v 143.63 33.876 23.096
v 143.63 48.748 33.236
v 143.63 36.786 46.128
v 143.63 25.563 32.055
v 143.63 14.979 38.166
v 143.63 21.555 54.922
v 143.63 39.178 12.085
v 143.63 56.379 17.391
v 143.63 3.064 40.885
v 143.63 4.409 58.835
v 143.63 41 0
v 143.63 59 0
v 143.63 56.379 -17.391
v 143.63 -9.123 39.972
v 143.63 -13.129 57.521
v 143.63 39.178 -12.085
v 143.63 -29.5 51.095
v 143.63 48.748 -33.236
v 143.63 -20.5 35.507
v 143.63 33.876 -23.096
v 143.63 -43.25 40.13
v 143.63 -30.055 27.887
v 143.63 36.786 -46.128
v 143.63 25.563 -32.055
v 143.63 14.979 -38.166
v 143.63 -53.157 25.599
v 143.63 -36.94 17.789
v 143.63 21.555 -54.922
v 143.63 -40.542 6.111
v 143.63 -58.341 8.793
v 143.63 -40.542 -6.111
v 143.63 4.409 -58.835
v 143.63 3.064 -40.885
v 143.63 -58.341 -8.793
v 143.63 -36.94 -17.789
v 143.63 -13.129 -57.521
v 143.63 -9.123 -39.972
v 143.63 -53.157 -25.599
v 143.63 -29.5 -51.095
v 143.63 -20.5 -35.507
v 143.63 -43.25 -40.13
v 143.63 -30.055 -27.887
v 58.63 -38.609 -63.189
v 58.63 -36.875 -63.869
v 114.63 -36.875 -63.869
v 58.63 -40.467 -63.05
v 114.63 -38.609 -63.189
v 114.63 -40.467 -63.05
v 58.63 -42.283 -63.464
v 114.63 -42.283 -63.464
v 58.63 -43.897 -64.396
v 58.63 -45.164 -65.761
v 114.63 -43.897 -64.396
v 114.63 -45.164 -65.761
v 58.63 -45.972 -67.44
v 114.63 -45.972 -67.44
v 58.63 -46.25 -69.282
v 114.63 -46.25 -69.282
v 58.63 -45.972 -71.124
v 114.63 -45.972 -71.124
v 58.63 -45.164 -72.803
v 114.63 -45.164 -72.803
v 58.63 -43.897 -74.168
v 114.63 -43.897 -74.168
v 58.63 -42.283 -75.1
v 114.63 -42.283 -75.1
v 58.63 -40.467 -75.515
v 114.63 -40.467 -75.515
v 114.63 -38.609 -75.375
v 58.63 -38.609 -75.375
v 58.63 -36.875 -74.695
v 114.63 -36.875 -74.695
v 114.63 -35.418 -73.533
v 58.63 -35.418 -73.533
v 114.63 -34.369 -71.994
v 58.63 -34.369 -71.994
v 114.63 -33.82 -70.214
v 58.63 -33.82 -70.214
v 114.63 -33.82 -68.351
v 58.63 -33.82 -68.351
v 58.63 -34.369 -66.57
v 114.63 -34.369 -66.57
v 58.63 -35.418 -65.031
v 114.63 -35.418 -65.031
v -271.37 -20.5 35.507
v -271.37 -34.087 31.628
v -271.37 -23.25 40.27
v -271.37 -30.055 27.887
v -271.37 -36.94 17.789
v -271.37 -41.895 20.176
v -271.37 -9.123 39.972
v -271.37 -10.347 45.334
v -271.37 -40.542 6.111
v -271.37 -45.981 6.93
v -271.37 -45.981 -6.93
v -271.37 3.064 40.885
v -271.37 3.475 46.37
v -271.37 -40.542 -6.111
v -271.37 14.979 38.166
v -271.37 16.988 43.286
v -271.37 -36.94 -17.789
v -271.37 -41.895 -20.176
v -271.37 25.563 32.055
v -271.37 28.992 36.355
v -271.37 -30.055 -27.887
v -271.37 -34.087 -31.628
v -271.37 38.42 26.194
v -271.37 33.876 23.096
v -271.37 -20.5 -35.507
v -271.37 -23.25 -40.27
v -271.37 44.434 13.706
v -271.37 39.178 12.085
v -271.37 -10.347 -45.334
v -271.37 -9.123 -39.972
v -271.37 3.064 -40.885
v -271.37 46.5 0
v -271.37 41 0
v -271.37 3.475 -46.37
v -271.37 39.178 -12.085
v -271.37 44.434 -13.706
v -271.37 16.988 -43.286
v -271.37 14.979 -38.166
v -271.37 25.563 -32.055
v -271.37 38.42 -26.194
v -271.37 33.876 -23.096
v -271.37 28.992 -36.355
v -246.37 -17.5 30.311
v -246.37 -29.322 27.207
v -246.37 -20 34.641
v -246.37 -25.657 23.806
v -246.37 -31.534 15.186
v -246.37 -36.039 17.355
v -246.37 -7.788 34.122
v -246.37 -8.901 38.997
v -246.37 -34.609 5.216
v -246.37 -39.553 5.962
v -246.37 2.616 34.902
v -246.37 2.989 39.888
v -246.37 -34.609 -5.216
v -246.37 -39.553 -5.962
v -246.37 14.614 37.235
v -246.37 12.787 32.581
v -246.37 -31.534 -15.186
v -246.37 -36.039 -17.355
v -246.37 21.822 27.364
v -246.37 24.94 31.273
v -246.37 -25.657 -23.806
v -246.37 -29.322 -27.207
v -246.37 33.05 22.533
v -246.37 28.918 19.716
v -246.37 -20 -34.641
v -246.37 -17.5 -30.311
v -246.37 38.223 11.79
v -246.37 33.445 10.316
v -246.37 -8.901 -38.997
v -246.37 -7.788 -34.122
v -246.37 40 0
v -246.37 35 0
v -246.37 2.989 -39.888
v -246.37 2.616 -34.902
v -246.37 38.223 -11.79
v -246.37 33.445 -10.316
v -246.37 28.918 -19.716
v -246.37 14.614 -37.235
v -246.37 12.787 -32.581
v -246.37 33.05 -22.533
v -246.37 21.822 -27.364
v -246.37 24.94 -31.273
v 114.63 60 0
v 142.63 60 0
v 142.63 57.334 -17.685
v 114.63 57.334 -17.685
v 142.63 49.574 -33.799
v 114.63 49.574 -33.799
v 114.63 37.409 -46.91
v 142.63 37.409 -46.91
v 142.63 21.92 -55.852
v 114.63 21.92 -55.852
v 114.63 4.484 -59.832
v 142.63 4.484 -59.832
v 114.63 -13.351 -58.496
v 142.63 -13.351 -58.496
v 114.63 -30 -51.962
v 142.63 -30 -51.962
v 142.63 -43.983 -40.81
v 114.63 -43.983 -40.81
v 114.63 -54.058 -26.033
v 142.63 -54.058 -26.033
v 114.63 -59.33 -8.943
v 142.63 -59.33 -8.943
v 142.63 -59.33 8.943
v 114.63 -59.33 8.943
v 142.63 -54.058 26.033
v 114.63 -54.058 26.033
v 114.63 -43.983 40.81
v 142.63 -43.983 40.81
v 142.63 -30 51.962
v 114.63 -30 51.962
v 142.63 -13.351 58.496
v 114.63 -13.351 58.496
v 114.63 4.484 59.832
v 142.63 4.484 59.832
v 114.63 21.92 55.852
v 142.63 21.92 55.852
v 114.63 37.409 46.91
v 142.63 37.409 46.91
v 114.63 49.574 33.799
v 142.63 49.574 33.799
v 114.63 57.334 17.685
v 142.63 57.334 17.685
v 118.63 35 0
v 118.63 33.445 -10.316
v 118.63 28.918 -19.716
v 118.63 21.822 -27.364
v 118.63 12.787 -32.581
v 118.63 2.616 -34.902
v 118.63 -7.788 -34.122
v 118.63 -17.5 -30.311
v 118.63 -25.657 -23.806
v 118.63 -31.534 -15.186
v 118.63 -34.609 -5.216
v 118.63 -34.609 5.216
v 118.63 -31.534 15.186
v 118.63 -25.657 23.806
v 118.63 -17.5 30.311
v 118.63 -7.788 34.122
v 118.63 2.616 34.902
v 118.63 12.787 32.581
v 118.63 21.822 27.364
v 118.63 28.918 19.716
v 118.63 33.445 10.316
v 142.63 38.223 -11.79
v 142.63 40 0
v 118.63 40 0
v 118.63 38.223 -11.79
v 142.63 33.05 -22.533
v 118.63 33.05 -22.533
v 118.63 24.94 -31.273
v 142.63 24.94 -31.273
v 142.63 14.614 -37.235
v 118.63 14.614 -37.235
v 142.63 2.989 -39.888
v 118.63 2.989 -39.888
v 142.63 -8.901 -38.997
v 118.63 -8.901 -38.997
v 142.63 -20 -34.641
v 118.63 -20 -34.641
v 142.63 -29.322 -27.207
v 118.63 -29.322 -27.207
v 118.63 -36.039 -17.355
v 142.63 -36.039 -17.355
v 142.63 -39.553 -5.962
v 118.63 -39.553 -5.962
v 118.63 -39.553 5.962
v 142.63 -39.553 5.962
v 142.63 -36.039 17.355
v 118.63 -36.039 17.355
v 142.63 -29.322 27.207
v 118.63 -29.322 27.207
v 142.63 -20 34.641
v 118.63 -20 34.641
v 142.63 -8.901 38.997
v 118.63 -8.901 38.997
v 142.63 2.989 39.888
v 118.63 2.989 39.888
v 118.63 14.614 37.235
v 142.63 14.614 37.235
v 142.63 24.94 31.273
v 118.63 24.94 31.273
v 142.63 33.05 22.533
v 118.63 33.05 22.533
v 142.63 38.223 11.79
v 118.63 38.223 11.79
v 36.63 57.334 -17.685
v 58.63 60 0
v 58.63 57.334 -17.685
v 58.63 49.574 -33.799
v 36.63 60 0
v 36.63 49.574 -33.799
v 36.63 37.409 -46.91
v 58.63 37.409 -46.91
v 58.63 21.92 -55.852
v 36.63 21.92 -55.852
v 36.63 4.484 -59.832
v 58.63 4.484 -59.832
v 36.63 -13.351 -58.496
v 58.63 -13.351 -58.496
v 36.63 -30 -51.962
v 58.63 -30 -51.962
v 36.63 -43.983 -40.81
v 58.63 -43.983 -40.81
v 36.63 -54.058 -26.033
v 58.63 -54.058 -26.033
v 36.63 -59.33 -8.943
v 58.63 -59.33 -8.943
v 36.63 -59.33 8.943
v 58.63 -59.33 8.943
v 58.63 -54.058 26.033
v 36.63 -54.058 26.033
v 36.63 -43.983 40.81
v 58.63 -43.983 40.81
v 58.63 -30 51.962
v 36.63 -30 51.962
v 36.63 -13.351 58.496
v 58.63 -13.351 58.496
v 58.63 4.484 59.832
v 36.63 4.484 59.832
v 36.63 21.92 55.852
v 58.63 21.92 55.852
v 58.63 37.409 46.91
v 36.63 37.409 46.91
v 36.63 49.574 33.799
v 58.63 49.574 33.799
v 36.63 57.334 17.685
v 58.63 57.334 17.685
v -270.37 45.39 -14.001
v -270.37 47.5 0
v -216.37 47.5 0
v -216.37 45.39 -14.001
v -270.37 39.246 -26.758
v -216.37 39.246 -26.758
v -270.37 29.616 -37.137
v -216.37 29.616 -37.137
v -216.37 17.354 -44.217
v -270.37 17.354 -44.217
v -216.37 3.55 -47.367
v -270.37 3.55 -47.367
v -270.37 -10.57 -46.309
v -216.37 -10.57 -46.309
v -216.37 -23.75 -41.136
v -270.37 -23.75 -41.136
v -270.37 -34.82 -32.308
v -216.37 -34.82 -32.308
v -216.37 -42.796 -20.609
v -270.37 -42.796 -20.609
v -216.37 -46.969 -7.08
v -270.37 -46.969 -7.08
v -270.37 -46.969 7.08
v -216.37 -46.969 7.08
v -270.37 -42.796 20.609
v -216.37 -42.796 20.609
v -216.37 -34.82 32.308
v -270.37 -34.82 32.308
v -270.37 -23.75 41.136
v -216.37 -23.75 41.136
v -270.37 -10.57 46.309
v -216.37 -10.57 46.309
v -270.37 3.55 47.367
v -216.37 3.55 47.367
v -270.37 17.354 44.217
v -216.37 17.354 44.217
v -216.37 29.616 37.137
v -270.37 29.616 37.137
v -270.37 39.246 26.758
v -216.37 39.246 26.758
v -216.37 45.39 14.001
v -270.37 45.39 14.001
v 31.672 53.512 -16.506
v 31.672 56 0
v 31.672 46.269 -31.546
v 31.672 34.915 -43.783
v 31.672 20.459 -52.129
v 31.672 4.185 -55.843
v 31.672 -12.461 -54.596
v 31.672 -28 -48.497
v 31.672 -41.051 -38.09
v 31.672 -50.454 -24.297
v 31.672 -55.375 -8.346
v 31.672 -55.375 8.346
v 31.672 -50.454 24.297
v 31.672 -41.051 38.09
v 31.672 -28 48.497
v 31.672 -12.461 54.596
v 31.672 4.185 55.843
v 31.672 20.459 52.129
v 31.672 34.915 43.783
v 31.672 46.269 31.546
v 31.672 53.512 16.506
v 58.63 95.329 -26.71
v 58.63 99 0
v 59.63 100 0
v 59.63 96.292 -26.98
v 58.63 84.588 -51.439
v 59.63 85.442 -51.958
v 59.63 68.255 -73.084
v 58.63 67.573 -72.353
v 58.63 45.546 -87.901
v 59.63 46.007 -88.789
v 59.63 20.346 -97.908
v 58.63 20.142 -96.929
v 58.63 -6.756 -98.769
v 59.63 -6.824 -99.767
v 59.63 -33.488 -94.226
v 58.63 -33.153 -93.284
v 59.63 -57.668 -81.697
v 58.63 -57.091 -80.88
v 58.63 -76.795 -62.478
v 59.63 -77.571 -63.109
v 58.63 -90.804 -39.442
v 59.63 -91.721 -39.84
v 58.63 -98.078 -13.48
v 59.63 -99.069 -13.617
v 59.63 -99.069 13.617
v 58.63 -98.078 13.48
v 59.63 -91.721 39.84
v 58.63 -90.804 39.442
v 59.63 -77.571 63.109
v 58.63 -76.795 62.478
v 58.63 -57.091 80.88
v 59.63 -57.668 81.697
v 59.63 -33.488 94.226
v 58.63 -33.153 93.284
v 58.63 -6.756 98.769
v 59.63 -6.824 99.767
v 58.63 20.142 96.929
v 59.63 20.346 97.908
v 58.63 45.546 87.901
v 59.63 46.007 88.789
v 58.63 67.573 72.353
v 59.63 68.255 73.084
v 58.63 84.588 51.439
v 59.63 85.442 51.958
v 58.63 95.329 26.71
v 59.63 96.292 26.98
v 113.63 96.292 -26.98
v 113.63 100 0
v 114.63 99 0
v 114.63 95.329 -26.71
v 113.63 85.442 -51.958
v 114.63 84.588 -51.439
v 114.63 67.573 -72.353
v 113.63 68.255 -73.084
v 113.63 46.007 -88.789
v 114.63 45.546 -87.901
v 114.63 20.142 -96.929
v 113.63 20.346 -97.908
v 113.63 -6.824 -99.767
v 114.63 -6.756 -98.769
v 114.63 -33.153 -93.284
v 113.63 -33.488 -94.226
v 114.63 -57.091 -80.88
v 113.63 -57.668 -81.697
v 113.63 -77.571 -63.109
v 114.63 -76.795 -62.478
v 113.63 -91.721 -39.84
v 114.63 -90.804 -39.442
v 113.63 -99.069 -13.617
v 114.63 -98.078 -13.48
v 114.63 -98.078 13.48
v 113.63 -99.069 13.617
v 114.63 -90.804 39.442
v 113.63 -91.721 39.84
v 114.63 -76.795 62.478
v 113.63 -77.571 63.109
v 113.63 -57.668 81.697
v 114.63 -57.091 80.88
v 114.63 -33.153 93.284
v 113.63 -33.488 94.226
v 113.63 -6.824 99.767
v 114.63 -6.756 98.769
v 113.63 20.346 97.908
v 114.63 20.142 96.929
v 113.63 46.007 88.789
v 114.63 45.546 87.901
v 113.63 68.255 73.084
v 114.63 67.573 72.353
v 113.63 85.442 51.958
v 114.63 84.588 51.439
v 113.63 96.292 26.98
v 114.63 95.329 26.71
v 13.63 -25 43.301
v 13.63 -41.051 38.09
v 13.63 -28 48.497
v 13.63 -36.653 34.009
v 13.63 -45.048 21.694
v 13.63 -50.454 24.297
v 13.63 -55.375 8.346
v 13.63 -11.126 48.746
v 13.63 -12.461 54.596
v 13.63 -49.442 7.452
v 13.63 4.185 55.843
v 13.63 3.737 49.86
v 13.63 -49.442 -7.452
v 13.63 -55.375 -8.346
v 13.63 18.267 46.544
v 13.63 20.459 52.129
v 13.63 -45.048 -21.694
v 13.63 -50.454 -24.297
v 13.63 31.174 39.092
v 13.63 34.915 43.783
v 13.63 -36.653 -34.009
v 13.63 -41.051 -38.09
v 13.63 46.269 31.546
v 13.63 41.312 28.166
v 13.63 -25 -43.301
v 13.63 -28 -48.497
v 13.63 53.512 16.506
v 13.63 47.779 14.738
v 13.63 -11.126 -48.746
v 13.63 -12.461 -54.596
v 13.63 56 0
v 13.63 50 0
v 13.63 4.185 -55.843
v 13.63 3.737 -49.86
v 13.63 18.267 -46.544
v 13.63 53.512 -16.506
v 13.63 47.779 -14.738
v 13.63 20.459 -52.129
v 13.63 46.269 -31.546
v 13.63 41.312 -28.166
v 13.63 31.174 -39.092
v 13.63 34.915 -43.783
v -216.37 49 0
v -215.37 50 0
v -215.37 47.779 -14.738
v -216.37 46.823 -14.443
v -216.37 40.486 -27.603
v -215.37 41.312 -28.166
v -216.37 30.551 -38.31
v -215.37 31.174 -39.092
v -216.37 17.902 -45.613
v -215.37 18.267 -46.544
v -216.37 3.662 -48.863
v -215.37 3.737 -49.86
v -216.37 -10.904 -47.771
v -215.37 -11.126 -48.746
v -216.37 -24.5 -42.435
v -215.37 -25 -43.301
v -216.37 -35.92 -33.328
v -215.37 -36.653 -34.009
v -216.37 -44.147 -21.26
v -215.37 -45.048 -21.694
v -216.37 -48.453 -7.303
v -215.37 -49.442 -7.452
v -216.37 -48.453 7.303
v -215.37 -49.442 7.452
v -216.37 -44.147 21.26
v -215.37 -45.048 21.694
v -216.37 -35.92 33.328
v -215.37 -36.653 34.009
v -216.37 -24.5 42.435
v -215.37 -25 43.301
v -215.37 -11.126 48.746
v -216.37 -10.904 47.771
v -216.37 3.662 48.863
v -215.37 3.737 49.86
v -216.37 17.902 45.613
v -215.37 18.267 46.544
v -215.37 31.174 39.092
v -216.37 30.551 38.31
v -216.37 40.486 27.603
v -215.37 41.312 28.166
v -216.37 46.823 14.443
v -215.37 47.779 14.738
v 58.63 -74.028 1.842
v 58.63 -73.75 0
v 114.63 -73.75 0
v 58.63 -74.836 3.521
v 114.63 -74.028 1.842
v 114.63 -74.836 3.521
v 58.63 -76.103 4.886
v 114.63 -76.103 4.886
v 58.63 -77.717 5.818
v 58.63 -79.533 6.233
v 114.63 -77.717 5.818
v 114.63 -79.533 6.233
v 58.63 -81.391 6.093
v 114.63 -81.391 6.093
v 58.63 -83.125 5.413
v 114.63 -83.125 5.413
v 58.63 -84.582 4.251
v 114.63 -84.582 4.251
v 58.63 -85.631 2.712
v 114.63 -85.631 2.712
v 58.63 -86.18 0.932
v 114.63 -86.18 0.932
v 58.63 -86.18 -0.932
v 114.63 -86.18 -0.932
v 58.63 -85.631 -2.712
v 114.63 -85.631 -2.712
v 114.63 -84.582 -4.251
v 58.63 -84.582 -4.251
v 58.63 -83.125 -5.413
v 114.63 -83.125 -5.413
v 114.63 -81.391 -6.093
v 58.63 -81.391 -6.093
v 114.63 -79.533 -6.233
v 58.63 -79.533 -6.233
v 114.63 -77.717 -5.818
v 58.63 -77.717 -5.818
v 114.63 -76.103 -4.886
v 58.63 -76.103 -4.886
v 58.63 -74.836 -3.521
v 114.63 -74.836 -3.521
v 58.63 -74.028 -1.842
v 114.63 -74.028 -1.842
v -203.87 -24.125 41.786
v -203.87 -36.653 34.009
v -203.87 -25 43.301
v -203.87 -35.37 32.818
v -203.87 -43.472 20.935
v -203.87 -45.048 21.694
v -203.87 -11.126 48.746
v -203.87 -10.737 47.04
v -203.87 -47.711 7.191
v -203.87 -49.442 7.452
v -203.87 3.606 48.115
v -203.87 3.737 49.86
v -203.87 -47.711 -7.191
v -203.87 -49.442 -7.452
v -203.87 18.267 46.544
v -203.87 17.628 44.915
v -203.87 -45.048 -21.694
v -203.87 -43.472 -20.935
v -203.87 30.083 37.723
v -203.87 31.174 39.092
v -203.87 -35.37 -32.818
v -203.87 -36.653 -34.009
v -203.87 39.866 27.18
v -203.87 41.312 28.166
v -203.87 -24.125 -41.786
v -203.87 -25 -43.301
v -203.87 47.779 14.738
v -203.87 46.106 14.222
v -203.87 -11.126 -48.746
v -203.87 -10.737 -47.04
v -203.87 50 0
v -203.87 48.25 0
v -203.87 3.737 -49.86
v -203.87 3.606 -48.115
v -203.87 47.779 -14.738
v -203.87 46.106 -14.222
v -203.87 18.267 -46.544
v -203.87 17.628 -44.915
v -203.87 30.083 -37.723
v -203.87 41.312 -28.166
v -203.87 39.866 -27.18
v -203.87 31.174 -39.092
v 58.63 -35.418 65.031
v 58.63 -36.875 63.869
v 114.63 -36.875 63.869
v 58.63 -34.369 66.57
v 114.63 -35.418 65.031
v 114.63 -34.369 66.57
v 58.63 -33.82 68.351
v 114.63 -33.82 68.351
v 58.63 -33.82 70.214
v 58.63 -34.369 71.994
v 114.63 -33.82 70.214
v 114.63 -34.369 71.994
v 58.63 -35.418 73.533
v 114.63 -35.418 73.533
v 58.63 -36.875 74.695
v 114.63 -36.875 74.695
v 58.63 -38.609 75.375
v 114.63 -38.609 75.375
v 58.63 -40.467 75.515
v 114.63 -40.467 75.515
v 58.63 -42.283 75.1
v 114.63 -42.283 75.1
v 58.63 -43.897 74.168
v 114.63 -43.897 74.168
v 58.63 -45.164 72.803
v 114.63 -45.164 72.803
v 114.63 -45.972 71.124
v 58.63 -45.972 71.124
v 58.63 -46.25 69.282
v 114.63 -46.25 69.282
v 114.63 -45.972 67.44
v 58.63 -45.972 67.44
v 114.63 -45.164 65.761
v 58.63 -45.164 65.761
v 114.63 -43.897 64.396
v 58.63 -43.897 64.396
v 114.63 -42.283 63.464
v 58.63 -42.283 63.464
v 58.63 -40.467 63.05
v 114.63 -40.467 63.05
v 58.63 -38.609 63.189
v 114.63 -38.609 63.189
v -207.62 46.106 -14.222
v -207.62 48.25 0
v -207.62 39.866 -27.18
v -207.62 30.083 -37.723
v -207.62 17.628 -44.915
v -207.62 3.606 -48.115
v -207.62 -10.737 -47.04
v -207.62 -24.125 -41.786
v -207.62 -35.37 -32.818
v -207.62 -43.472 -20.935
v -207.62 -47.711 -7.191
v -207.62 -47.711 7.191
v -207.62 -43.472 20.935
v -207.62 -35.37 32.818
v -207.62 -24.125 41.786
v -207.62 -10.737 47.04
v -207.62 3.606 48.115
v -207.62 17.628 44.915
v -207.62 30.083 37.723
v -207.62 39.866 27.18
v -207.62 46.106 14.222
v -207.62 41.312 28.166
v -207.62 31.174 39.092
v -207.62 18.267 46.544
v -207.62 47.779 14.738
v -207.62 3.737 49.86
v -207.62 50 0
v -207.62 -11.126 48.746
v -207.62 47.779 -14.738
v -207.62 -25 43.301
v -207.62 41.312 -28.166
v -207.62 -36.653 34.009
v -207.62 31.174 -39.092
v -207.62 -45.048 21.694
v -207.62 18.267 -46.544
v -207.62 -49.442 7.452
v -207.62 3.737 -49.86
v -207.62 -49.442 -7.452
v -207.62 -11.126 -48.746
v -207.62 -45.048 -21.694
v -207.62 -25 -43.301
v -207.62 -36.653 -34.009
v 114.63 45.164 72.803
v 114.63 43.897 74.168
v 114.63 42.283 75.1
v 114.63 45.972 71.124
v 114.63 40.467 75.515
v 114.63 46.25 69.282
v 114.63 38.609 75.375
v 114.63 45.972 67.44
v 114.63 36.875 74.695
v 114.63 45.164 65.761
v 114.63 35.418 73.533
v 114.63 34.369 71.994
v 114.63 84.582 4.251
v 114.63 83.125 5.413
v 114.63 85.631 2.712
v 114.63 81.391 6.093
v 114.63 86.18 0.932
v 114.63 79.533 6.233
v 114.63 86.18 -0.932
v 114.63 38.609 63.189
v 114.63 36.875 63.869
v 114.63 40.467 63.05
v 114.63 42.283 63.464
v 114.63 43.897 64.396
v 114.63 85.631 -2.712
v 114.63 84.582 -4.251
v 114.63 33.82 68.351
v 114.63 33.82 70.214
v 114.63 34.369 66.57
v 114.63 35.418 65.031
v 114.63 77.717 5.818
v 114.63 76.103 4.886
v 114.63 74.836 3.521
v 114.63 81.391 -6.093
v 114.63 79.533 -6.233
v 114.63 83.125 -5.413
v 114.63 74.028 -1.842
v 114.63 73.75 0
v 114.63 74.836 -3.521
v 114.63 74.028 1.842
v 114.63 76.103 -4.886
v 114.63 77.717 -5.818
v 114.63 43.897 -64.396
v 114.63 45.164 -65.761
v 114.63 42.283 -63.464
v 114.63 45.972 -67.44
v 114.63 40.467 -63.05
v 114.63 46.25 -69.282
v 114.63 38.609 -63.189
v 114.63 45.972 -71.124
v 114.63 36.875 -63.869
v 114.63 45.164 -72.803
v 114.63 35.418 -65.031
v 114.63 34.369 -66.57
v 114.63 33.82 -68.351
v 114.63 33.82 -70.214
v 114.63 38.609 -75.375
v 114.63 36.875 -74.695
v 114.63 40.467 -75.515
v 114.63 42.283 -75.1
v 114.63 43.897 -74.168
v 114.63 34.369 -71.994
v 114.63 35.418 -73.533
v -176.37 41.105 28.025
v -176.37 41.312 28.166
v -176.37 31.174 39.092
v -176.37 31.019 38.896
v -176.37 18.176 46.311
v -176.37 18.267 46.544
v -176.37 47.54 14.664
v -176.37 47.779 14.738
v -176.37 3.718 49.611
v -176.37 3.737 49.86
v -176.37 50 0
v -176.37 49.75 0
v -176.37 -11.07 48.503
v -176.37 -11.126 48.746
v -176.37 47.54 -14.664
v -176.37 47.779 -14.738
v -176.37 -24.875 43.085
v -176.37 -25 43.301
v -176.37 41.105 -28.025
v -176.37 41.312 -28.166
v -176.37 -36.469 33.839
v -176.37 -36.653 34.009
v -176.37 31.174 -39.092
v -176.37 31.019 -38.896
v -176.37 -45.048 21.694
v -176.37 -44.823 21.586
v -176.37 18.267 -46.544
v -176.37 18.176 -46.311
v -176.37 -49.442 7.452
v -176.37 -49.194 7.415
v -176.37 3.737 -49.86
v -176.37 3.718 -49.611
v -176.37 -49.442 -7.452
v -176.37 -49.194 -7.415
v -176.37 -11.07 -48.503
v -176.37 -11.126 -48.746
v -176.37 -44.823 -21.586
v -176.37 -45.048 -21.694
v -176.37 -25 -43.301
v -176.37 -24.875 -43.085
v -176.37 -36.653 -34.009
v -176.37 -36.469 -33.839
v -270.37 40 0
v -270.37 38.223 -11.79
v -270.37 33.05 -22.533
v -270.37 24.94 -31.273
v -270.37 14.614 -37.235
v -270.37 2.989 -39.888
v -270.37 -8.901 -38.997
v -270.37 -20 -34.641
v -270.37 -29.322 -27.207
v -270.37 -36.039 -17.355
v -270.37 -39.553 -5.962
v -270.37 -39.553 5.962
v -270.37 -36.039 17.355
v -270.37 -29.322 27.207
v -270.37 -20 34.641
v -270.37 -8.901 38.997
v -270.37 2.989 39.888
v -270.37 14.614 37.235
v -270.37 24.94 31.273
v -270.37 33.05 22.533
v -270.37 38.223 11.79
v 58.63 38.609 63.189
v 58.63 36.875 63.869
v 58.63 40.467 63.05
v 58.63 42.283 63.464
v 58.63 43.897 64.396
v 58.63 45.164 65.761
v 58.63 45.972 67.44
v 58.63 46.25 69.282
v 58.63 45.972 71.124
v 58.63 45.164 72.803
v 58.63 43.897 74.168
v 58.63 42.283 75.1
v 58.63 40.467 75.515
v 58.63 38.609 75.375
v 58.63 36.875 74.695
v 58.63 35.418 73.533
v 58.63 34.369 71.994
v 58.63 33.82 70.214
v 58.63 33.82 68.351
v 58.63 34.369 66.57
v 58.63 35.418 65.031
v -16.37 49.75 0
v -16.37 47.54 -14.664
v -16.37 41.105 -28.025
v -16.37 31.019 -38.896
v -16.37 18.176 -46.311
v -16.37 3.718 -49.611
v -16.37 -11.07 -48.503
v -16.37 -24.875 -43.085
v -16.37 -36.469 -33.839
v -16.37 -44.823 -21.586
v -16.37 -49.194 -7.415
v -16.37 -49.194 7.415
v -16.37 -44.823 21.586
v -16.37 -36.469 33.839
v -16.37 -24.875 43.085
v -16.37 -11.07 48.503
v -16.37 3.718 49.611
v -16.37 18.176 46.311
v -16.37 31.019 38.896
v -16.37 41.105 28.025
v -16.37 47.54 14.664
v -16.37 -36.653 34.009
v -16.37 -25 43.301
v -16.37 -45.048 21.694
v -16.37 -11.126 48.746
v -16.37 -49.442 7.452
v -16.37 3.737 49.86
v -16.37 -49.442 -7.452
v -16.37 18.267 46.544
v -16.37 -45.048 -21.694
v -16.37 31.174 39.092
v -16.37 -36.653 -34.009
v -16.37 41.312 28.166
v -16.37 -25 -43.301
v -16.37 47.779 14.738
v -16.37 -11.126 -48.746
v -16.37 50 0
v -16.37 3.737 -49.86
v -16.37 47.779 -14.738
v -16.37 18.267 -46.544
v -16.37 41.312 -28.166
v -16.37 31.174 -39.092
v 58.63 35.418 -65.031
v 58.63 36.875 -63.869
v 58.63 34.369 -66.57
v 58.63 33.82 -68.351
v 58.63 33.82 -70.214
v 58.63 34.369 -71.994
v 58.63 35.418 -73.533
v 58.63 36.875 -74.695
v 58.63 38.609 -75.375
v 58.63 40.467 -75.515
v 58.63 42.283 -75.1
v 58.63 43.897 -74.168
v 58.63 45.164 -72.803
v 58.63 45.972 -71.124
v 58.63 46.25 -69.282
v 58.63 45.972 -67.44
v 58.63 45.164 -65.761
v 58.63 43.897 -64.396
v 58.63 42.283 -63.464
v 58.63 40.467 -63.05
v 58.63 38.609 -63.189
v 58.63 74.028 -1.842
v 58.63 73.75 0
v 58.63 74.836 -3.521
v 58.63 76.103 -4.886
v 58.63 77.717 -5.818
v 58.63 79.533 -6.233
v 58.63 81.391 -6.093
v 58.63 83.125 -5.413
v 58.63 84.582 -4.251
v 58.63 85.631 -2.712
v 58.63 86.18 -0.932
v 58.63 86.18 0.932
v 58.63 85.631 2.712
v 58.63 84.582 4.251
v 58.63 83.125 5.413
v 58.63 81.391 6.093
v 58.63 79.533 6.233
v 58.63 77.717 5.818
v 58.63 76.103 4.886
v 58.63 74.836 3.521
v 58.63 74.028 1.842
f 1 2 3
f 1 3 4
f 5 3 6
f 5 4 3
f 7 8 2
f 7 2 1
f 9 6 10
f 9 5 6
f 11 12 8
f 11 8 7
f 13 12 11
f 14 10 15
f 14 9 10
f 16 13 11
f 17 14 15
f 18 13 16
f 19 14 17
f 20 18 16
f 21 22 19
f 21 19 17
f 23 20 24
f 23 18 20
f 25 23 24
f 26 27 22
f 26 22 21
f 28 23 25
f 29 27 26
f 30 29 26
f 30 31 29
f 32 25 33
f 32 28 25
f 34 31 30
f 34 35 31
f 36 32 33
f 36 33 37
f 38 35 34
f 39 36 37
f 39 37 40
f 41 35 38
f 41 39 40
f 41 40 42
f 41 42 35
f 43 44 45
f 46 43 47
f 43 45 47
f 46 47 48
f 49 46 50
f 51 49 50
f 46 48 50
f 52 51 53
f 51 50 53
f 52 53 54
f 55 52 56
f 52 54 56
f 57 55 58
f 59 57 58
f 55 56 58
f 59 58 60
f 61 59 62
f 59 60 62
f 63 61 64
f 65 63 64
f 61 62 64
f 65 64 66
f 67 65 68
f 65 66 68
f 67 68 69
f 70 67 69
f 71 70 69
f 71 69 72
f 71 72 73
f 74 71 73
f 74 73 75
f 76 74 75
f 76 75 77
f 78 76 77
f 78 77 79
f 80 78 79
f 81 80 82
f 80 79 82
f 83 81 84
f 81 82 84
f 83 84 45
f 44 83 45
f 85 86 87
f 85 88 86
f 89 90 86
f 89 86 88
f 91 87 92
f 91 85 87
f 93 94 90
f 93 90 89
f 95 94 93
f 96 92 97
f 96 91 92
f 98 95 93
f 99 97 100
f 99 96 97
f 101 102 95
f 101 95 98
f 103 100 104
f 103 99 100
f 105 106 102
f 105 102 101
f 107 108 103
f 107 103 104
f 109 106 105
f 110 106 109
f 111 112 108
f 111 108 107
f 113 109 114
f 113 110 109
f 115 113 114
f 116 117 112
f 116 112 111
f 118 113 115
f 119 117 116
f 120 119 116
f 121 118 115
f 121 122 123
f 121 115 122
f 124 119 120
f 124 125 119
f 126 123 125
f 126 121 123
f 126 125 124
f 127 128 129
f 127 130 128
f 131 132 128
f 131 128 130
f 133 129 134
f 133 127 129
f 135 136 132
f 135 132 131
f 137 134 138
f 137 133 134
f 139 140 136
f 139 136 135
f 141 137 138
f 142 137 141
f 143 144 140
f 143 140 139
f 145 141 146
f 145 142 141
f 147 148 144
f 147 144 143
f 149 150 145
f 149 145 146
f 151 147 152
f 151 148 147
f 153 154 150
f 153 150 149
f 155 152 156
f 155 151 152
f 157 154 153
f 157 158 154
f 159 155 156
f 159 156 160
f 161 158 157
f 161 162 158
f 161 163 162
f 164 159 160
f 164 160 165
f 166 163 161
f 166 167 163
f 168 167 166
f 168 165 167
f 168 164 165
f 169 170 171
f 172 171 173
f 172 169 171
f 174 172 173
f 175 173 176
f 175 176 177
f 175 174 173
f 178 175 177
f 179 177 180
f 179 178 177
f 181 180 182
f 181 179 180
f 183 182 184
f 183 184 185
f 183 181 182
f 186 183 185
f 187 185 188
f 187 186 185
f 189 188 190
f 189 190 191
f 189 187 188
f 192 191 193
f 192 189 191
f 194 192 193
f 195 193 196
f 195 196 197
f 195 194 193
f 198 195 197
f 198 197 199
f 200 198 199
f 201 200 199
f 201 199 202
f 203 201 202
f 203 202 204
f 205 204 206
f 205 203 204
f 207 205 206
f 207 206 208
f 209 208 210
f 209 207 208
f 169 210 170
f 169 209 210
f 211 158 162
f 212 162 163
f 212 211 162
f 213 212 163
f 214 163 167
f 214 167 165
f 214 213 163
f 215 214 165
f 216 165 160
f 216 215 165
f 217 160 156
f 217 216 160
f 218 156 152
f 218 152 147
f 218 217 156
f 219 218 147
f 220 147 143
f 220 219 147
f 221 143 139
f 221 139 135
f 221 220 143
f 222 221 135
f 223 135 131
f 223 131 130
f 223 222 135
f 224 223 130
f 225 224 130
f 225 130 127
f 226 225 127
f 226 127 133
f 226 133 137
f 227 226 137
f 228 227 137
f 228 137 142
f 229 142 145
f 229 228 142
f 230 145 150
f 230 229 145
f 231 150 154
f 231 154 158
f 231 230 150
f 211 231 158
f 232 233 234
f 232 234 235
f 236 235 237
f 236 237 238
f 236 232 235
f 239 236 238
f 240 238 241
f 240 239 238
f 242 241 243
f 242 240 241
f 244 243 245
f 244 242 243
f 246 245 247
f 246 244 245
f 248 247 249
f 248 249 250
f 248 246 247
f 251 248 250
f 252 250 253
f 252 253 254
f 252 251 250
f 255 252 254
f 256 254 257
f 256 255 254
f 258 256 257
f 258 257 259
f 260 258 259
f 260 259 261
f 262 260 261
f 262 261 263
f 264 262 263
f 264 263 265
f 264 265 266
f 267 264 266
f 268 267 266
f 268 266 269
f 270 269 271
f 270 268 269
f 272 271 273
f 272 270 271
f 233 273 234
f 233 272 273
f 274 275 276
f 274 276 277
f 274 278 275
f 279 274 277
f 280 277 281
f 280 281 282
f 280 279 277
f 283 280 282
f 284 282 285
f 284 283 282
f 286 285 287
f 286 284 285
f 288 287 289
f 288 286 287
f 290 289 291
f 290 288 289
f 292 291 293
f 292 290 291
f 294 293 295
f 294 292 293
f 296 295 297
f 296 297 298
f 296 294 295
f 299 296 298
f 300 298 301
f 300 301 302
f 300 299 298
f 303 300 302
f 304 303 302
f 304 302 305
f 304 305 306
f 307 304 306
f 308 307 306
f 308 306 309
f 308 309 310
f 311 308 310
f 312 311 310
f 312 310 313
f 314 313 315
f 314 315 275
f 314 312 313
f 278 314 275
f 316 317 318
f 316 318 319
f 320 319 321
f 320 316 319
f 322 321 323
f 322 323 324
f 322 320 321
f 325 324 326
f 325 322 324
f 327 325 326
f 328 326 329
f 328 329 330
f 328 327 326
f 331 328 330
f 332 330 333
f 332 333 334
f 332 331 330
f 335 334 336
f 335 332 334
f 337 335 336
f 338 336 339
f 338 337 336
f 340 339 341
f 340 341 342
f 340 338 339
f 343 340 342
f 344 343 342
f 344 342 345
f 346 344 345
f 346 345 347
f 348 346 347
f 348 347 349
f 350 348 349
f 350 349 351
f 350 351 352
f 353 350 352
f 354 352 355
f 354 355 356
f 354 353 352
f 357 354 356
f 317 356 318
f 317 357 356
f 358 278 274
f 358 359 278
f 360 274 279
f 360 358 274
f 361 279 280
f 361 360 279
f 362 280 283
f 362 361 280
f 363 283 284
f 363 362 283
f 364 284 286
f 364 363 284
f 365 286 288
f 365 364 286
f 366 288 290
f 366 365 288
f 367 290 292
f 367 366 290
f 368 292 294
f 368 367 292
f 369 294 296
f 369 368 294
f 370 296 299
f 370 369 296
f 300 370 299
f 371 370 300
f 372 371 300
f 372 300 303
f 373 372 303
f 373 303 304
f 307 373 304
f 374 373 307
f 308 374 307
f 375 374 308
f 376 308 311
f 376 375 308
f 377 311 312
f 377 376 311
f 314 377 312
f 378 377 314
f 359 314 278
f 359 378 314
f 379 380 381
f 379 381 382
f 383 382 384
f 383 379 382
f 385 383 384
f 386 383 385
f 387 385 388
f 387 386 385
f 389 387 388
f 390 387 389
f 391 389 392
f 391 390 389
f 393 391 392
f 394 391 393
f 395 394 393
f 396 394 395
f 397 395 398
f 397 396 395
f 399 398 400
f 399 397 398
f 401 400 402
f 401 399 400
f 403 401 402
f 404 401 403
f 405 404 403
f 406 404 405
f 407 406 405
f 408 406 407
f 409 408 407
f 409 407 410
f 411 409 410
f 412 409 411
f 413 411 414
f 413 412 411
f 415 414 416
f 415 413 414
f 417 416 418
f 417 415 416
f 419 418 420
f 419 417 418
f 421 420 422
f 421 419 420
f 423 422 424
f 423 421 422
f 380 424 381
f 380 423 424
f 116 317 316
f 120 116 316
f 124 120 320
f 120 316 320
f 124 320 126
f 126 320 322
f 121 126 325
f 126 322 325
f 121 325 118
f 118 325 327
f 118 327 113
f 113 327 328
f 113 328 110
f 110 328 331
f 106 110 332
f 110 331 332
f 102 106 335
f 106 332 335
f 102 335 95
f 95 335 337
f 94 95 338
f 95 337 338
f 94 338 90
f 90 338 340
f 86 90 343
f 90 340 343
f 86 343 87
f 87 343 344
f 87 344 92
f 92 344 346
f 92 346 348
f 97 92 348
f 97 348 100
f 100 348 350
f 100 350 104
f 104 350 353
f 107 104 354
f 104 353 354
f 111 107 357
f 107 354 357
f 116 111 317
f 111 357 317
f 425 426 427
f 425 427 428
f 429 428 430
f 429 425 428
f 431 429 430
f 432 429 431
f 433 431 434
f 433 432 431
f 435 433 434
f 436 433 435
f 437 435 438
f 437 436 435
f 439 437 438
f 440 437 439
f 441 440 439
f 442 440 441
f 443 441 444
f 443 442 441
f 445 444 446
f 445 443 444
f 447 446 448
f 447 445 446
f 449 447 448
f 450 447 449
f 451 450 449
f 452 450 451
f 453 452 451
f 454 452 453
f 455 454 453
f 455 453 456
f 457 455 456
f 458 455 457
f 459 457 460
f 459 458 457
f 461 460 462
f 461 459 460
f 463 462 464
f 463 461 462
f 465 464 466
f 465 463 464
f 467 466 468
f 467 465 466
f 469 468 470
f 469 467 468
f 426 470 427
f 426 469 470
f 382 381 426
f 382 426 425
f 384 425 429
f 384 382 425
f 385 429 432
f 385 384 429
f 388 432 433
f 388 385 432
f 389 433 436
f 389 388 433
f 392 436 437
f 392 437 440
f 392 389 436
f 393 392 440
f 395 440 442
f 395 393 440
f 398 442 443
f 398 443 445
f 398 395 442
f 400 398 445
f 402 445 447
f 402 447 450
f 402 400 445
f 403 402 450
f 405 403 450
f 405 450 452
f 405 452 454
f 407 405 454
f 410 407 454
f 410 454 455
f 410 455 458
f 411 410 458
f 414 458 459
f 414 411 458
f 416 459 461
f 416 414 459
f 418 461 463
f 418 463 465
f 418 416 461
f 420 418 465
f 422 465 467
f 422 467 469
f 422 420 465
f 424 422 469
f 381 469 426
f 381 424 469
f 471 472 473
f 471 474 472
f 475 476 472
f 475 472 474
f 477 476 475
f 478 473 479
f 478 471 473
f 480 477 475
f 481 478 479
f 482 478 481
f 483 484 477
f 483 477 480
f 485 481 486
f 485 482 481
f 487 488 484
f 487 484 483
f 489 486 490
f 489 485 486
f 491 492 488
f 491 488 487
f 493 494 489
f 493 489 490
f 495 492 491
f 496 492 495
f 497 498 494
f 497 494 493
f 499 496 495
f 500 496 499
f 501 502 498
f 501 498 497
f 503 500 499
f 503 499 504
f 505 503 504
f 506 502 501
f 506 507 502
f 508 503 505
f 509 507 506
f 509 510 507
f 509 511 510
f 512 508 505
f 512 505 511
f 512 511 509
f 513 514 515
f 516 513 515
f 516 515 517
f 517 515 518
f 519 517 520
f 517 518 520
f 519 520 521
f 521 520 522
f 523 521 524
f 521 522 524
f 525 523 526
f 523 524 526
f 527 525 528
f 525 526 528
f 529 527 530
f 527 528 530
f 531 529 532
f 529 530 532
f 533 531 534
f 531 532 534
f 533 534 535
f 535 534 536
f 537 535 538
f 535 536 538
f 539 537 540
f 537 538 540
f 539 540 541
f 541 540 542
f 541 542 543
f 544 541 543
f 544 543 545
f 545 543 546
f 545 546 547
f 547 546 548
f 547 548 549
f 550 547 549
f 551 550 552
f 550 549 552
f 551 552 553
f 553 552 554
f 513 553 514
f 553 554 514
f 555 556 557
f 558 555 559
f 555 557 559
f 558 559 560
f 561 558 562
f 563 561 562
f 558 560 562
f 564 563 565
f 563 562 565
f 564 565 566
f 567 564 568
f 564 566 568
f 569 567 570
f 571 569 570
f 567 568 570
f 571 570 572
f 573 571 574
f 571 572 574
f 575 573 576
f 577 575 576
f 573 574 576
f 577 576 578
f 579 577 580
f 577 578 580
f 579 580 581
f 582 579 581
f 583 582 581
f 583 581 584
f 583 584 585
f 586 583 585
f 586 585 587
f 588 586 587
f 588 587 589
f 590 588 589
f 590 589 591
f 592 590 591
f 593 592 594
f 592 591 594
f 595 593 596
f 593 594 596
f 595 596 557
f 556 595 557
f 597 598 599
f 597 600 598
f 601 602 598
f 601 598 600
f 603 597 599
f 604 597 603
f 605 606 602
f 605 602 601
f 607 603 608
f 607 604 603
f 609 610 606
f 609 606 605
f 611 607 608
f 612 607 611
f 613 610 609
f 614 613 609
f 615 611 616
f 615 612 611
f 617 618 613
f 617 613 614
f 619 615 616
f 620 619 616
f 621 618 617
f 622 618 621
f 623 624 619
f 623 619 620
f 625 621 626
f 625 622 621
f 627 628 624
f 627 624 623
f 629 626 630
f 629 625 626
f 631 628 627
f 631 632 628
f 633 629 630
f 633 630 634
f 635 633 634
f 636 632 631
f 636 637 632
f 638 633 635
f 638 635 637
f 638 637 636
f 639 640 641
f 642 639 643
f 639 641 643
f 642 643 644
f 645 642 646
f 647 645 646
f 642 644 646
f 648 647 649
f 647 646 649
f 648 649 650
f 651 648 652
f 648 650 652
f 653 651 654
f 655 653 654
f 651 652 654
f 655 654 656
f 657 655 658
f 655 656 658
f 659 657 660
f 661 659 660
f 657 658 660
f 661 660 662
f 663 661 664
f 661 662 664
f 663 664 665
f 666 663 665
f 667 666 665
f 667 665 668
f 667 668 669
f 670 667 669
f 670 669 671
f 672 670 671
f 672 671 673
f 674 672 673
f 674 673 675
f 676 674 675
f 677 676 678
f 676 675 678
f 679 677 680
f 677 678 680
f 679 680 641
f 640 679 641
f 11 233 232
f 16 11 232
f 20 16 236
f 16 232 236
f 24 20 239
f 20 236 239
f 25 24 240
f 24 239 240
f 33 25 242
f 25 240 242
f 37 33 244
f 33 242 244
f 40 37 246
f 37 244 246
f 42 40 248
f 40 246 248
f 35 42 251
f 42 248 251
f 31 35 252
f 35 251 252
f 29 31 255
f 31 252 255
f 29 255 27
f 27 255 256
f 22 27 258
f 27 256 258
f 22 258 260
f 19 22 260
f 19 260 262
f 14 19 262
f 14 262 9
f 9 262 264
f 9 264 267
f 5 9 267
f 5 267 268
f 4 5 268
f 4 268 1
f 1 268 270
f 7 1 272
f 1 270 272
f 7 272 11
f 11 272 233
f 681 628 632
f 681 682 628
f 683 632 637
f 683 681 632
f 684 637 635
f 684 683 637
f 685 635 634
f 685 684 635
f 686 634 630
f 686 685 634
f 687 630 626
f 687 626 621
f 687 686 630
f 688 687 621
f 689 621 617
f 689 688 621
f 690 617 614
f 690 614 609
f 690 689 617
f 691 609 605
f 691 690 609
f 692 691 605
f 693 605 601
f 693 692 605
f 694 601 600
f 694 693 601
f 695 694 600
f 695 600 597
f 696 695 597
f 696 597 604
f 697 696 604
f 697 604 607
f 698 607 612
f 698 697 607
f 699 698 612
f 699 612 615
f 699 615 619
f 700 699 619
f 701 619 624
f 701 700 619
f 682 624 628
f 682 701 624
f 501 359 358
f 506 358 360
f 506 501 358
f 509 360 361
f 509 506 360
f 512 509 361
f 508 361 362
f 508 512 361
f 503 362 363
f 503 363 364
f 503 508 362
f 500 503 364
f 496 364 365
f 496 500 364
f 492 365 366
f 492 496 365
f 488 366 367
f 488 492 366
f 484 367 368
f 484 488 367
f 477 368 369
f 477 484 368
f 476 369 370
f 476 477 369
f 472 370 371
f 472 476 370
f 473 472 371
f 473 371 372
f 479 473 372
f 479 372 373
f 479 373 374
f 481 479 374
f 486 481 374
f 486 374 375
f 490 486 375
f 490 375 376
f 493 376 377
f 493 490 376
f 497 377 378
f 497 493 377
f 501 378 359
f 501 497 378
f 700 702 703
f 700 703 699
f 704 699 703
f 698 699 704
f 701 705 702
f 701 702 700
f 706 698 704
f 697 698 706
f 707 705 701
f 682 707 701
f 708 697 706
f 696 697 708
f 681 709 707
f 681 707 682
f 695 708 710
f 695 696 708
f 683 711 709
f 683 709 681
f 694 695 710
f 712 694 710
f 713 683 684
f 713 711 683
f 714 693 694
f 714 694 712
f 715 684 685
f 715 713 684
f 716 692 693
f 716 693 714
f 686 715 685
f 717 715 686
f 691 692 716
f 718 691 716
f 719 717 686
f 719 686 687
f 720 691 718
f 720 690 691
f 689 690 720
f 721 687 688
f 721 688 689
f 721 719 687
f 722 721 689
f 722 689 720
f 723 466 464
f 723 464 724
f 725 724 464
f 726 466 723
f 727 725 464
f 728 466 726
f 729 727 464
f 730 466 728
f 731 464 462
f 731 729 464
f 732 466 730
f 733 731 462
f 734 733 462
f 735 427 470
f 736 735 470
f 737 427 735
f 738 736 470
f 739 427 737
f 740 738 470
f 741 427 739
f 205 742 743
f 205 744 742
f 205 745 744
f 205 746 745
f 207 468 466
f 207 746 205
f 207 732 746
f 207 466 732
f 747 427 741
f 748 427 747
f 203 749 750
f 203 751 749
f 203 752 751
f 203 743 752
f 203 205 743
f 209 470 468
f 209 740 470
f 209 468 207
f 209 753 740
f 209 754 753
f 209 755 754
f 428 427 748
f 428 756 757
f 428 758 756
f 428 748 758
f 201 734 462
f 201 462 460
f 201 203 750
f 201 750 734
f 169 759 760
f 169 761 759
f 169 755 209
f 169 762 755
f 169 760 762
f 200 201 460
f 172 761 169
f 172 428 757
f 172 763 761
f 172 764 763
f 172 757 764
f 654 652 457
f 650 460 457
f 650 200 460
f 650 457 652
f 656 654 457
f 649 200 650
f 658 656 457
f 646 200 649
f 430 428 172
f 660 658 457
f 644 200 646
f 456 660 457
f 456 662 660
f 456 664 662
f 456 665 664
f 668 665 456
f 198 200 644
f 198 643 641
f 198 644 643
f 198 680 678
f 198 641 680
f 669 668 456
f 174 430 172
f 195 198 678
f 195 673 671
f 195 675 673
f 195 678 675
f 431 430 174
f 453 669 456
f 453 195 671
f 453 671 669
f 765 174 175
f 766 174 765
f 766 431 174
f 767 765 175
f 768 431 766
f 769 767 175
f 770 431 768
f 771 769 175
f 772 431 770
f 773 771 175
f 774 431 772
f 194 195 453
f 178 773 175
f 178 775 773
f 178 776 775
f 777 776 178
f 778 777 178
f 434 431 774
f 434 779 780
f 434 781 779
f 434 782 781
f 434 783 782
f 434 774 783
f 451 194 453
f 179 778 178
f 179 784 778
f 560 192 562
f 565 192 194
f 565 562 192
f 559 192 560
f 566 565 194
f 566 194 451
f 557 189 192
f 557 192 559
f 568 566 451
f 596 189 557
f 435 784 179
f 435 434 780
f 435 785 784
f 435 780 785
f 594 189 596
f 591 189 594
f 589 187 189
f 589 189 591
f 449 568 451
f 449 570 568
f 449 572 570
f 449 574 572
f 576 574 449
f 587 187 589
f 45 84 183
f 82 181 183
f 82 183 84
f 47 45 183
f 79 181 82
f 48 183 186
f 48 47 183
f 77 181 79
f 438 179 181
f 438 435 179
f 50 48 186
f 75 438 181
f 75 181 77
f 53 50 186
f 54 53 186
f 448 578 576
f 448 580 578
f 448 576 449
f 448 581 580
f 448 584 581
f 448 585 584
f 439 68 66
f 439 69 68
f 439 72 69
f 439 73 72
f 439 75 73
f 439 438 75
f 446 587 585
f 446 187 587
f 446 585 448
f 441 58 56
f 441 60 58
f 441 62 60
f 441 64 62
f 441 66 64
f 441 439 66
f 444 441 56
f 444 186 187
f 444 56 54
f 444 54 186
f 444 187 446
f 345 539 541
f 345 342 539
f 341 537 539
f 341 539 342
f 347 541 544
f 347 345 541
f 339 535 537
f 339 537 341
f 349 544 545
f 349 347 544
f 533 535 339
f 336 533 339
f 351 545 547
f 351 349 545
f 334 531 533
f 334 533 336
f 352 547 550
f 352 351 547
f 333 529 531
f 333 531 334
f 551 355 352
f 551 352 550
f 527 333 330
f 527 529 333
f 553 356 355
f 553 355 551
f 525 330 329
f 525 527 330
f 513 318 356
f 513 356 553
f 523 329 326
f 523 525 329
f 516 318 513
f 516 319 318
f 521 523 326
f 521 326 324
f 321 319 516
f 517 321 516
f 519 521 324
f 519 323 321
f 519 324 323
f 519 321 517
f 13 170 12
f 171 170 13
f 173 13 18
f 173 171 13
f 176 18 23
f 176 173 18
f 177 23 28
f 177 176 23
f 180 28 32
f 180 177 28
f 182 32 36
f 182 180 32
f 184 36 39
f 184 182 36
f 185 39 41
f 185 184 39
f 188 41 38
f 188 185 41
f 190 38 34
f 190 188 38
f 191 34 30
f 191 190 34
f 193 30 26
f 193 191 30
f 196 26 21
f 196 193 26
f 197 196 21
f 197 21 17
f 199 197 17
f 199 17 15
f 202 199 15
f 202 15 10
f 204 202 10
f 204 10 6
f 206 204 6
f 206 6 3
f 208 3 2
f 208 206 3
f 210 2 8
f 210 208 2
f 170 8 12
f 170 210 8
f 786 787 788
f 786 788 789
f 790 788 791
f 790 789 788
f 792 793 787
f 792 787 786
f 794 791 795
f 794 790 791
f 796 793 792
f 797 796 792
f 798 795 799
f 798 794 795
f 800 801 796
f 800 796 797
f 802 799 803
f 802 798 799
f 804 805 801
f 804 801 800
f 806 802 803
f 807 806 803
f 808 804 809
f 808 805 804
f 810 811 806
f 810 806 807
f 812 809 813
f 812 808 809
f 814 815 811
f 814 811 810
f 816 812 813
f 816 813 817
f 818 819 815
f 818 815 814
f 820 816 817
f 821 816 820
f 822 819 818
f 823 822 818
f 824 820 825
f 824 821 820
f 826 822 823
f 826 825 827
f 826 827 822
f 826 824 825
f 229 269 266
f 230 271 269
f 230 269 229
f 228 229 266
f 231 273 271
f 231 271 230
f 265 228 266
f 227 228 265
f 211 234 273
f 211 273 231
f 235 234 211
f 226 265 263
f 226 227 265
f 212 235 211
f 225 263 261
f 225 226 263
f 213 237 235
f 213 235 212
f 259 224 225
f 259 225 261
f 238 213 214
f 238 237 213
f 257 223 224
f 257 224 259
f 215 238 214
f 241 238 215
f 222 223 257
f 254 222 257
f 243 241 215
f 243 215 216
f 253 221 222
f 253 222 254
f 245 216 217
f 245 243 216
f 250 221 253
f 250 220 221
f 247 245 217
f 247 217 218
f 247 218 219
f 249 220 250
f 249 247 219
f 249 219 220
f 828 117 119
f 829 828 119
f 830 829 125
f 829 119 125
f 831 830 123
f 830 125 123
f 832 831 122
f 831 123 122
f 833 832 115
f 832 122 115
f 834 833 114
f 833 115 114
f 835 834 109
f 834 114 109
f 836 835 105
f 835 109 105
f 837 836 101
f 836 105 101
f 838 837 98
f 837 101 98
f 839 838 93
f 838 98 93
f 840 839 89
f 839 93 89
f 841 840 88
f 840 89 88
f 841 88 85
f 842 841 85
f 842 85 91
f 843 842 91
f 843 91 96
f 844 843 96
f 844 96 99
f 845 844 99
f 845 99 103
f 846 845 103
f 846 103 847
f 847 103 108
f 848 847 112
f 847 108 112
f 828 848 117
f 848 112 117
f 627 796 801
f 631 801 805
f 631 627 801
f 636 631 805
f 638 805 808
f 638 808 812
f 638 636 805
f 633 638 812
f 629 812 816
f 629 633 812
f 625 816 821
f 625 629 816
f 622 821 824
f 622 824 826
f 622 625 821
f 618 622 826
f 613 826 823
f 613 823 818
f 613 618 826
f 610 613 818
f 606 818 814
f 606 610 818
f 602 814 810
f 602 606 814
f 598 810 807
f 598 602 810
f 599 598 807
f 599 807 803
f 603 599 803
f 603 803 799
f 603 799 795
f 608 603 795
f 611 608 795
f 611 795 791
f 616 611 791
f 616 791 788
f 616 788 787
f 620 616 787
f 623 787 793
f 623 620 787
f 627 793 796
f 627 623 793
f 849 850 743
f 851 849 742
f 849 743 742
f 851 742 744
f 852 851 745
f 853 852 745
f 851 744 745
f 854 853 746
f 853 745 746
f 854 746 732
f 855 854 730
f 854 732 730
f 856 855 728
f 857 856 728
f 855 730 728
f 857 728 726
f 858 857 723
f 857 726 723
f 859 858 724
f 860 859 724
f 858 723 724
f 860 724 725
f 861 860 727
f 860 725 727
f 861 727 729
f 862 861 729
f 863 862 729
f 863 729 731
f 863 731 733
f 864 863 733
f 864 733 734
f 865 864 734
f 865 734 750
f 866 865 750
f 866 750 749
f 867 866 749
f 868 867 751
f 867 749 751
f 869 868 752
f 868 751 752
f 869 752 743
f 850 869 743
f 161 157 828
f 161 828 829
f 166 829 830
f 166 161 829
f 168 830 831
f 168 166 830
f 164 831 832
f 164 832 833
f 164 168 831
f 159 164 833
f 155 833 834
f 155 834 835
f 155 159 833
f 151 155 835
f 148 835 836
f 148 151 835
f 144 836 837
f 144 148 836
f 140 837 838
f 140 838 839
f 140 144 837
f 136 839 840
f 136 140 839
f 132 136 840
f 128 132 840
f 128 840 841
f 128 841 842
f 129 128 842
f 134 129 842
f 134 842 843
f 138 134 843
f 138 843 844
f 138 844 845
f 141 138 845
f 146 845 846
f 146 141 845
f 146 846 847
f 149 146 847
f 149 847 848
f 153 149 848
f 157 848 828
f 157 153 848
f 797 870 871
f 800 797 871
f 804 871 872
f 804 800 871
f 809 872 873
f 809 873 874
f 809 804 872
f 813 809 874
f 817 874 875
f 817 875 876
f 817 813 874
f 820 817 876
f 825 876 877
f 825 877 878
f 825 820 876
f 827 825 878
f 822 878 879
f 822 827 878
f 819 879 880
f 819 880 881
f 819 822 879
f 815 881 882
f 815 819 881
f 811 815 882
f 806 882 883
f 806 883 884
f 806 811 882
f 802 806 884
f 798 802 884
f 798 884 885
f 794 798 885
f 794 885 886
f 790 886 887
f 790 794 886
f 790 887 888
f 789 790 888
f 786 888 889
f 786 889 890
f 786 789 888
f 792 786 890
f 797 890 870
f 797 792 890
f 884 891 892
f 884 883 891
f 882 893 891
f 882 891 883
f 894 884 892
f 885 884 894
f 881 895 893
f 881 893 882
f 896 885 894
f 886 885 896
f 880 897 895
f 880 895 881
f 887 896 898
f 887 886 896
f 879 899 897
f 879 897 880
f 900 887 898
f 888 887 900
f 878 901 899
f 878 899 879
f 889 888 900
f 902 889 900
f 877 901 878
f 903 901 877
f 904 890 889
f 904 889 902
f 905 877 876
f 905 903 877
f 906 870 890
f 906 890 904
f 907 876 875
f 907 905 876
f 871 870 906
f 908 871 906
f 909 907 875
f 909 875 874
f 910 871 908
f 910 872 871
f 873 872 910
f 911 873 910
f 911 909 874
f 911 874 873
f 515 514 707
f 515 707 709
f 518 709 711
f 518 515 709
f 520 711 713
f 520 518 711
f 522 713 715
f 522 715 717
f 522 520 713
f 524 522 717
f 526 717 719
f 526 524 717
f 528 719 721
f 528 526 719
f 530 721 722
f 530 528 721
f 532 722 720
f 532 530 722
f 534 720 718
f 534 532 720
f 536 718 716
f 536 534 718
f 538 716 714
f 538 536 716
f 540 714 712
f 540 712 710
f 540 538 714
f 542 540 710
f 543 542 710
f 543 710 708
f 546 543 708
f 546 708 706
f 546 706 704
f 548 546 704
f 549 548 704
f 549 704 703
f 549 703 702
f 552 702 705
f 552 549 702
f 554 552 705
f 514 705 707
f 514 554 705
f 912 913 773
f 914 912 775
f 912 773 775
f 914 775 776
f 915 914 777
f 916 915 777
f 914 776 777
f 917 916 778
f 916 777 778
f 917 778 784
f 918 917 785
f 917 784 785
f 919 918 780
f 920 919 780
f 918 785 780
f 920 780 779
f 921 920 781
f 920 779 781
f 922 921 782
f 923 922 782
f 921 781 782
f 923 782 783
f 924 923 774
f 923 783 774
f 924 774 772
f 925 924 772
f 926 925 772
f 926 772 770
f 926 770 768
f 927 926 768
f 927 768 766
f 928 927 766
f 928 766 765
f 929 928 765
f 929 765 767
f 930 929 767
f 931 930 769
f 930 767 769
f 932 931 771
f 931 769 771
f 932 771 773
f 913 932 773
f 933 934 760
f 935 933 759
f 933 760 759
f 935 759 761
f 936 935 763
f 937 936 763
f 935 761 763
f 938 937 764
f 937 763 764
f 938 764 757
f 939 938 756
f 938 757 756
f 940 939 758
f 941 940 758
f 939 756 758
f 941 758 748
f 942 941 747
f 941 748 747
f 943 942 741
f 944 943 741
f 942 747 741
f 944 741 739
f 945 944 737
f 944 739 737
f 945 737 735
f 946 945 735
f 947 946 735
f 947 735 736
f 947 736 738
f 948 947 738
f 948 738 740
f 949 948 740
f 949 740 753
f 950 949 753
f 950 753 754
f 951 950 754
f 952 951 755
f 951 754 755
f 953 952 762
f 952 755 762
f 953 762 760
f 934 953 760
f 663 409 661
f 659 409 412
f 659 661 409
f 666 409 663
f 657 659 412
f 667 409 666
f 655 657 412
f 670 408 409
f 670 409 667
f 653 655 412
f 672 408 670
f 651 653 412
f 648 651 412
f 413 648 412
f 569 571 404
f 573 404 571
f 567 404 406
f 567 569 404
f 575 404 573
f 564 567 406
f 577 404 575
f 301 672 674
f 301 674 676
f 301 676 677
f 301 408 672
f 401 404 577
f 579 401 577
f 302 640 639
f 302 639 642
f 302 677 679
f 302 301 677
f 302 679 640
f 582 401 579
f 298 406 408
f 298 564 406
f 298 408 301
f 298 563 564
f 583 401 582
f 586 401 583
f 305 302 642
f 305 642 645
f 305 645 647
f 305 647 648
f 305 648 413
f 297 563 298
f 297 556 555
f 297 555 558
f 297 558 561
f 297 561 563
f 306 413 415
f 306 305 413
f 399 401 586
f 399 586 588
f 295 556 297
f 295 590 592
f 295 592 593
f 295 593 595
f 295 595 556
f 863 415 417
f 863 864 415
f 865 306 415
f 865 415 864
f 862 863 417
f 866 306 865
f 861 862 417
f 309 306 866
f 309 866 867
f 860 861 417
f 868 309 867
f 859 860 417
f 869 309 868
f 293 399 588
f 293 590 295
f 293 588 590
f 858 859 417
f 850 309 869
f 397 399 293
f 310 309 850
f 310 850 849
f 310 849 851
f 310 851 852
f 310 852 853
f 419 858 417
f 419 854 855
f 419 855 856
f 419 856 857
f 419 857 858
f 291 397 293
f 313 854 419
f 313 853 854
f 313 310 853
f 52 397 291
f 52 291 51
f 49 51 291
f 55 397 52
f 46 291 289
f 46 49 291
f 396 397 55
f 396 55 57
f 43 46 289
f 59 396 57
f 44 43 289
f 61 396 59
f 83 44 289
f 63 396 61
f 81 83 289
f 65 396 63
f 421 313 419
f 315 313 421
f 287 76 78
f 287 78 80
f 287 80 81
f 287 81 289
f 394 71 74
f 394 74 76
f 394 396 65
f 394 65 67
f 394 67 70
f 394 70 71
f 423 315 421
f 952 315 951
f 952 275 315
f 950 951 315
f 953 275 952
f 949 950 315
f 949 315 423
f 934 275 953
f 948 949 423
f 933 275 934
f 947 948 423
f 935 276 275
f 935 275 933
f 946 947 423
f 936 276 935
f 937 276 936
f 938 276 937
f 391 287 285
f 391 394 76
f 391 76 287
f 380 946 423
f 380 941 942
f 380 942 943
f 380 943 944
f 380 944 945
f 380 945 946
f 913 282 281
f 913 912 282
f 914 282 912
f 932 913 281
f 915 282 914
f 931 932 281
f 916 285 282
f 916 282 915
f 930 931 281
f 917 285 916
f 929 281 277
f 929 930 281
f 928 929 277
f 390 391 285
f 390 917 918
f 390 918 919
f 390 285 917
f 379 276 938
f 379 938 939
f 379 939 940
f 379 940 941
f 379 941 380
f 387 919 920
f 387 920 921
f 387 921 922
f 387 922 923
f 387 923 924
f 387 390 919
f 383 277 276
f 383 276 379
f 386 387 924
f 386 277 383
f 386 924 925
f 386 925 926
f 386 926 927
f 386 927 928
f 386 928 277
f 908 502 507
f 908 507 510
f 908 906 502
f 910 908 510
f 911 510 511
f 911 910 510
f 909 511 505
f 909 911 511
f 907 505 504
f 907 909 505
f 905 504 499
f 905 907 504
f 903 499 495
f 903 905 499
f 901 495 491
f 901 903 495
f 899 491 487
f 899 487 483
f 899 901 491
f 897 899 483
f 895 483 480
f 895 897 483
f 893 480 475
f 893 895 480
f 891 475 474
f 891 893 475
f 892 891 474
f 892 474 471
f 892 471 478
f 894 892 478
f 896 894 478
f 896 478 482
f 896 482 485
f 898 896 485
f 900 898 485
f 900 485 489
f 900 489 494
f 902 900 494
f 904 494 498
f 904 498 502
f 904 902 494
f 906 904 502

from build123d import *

# Parameters (mm, degrees)
SMUSSO1_SIZE                = 1
SMUSSO2_SIZE                = 1
SCHIZZO6_R                  = 6.25
TAGLIO_ESTRUSIONE1_DEPTH    = 56
RIPETIZIONECIRCOLARE1_COUNT = 6


with BuildPart() as part:
    # Schizzo1 → Rivoluzione1 (revolve)
    with BuildSketch(Plane.XY):
        Polygon((13.630317818, 50), (-16.369682182, 50), (-16.369682182, 49.75), (-176.369682182, 49.75), (-176.369682182, 50), (-203.869682182, 50), (-203.869682182, 48.25), (-207.619682182, 48.25), (-207.619682182, 50), (-216.369682182, 50), (-216.369682182, 47.5), (-271.369682182, 47.5), (-271.369682182, 40), (-246.369682182, 40), (-246.369682182, 35), (118.630317818, 35), (118.630317818, 40), (143.630317818, 40), (143.630317818, 60), (114.630317818, 60), (114.630317818, 100), (58.630317818, 100), (58.630317818, 60), (36.630317818, 60), (31.672388014, 56), (13.630317818, 56), align=None)
    revolve(axis=Axis((0, 0, 0), (-1, 0, 0)))

    # Smusso1
    smusso1_edges = [part.edges().sort_by_distance(p)[0] for p in [
        (58.630317818, -100, 0),
        (114.630317818, -100, 0),
        (143.630317818, -60, 0),
    ]]
    chamfer(smusso1_edges, length=SMUSSO1_SIZE)

    # Smusso2
    smusso2_edges = [part.edges().sort_by_distance(p)[0] for p in [
        (143.630317818, -40, 0),
        (-271.369682182, -40, 0),
        (-271.369682182, -47.5, 0),
        (-216.369682182, -50, 0),
    ]]
    chamfer(smusso2_edges, length=SMUSSO2_SIZE)

    # Schizzo6 → Taglio-Estrusione1 (cut)
    with BuildSketch(Plane(origin=(114.630317818, 0, 0), x_dir=(0, 0, -1), z_dir=(1, 0, 0))):
        with Locations(Location((0, -80, 0), (0, 0, 90))):
            Circle(SCHIZZO6_R)
    taglio_estrusione1 = extrude(amount=-TAGLIO_ESTRUSIONE1_DEPTH, mode=Mode.SUBTRACT)

    # RipetizioneCircolare1: Taglio-Estrusione1 ×6 about axis
    ripetizionecircolare1_axis = Axis((0, 0, 0), (1, 0, 0))
    for i in range(1, RIPETIZIONECIRCOLARE1_COUNT):
        add(taglio_estrusione1.rotate(ripetizionecircolare1_axis, i * 360 / RIPETIZIONECIRCOLARE1_COUNT), mode=Mode.SUBTRACT)


solid = part.part
